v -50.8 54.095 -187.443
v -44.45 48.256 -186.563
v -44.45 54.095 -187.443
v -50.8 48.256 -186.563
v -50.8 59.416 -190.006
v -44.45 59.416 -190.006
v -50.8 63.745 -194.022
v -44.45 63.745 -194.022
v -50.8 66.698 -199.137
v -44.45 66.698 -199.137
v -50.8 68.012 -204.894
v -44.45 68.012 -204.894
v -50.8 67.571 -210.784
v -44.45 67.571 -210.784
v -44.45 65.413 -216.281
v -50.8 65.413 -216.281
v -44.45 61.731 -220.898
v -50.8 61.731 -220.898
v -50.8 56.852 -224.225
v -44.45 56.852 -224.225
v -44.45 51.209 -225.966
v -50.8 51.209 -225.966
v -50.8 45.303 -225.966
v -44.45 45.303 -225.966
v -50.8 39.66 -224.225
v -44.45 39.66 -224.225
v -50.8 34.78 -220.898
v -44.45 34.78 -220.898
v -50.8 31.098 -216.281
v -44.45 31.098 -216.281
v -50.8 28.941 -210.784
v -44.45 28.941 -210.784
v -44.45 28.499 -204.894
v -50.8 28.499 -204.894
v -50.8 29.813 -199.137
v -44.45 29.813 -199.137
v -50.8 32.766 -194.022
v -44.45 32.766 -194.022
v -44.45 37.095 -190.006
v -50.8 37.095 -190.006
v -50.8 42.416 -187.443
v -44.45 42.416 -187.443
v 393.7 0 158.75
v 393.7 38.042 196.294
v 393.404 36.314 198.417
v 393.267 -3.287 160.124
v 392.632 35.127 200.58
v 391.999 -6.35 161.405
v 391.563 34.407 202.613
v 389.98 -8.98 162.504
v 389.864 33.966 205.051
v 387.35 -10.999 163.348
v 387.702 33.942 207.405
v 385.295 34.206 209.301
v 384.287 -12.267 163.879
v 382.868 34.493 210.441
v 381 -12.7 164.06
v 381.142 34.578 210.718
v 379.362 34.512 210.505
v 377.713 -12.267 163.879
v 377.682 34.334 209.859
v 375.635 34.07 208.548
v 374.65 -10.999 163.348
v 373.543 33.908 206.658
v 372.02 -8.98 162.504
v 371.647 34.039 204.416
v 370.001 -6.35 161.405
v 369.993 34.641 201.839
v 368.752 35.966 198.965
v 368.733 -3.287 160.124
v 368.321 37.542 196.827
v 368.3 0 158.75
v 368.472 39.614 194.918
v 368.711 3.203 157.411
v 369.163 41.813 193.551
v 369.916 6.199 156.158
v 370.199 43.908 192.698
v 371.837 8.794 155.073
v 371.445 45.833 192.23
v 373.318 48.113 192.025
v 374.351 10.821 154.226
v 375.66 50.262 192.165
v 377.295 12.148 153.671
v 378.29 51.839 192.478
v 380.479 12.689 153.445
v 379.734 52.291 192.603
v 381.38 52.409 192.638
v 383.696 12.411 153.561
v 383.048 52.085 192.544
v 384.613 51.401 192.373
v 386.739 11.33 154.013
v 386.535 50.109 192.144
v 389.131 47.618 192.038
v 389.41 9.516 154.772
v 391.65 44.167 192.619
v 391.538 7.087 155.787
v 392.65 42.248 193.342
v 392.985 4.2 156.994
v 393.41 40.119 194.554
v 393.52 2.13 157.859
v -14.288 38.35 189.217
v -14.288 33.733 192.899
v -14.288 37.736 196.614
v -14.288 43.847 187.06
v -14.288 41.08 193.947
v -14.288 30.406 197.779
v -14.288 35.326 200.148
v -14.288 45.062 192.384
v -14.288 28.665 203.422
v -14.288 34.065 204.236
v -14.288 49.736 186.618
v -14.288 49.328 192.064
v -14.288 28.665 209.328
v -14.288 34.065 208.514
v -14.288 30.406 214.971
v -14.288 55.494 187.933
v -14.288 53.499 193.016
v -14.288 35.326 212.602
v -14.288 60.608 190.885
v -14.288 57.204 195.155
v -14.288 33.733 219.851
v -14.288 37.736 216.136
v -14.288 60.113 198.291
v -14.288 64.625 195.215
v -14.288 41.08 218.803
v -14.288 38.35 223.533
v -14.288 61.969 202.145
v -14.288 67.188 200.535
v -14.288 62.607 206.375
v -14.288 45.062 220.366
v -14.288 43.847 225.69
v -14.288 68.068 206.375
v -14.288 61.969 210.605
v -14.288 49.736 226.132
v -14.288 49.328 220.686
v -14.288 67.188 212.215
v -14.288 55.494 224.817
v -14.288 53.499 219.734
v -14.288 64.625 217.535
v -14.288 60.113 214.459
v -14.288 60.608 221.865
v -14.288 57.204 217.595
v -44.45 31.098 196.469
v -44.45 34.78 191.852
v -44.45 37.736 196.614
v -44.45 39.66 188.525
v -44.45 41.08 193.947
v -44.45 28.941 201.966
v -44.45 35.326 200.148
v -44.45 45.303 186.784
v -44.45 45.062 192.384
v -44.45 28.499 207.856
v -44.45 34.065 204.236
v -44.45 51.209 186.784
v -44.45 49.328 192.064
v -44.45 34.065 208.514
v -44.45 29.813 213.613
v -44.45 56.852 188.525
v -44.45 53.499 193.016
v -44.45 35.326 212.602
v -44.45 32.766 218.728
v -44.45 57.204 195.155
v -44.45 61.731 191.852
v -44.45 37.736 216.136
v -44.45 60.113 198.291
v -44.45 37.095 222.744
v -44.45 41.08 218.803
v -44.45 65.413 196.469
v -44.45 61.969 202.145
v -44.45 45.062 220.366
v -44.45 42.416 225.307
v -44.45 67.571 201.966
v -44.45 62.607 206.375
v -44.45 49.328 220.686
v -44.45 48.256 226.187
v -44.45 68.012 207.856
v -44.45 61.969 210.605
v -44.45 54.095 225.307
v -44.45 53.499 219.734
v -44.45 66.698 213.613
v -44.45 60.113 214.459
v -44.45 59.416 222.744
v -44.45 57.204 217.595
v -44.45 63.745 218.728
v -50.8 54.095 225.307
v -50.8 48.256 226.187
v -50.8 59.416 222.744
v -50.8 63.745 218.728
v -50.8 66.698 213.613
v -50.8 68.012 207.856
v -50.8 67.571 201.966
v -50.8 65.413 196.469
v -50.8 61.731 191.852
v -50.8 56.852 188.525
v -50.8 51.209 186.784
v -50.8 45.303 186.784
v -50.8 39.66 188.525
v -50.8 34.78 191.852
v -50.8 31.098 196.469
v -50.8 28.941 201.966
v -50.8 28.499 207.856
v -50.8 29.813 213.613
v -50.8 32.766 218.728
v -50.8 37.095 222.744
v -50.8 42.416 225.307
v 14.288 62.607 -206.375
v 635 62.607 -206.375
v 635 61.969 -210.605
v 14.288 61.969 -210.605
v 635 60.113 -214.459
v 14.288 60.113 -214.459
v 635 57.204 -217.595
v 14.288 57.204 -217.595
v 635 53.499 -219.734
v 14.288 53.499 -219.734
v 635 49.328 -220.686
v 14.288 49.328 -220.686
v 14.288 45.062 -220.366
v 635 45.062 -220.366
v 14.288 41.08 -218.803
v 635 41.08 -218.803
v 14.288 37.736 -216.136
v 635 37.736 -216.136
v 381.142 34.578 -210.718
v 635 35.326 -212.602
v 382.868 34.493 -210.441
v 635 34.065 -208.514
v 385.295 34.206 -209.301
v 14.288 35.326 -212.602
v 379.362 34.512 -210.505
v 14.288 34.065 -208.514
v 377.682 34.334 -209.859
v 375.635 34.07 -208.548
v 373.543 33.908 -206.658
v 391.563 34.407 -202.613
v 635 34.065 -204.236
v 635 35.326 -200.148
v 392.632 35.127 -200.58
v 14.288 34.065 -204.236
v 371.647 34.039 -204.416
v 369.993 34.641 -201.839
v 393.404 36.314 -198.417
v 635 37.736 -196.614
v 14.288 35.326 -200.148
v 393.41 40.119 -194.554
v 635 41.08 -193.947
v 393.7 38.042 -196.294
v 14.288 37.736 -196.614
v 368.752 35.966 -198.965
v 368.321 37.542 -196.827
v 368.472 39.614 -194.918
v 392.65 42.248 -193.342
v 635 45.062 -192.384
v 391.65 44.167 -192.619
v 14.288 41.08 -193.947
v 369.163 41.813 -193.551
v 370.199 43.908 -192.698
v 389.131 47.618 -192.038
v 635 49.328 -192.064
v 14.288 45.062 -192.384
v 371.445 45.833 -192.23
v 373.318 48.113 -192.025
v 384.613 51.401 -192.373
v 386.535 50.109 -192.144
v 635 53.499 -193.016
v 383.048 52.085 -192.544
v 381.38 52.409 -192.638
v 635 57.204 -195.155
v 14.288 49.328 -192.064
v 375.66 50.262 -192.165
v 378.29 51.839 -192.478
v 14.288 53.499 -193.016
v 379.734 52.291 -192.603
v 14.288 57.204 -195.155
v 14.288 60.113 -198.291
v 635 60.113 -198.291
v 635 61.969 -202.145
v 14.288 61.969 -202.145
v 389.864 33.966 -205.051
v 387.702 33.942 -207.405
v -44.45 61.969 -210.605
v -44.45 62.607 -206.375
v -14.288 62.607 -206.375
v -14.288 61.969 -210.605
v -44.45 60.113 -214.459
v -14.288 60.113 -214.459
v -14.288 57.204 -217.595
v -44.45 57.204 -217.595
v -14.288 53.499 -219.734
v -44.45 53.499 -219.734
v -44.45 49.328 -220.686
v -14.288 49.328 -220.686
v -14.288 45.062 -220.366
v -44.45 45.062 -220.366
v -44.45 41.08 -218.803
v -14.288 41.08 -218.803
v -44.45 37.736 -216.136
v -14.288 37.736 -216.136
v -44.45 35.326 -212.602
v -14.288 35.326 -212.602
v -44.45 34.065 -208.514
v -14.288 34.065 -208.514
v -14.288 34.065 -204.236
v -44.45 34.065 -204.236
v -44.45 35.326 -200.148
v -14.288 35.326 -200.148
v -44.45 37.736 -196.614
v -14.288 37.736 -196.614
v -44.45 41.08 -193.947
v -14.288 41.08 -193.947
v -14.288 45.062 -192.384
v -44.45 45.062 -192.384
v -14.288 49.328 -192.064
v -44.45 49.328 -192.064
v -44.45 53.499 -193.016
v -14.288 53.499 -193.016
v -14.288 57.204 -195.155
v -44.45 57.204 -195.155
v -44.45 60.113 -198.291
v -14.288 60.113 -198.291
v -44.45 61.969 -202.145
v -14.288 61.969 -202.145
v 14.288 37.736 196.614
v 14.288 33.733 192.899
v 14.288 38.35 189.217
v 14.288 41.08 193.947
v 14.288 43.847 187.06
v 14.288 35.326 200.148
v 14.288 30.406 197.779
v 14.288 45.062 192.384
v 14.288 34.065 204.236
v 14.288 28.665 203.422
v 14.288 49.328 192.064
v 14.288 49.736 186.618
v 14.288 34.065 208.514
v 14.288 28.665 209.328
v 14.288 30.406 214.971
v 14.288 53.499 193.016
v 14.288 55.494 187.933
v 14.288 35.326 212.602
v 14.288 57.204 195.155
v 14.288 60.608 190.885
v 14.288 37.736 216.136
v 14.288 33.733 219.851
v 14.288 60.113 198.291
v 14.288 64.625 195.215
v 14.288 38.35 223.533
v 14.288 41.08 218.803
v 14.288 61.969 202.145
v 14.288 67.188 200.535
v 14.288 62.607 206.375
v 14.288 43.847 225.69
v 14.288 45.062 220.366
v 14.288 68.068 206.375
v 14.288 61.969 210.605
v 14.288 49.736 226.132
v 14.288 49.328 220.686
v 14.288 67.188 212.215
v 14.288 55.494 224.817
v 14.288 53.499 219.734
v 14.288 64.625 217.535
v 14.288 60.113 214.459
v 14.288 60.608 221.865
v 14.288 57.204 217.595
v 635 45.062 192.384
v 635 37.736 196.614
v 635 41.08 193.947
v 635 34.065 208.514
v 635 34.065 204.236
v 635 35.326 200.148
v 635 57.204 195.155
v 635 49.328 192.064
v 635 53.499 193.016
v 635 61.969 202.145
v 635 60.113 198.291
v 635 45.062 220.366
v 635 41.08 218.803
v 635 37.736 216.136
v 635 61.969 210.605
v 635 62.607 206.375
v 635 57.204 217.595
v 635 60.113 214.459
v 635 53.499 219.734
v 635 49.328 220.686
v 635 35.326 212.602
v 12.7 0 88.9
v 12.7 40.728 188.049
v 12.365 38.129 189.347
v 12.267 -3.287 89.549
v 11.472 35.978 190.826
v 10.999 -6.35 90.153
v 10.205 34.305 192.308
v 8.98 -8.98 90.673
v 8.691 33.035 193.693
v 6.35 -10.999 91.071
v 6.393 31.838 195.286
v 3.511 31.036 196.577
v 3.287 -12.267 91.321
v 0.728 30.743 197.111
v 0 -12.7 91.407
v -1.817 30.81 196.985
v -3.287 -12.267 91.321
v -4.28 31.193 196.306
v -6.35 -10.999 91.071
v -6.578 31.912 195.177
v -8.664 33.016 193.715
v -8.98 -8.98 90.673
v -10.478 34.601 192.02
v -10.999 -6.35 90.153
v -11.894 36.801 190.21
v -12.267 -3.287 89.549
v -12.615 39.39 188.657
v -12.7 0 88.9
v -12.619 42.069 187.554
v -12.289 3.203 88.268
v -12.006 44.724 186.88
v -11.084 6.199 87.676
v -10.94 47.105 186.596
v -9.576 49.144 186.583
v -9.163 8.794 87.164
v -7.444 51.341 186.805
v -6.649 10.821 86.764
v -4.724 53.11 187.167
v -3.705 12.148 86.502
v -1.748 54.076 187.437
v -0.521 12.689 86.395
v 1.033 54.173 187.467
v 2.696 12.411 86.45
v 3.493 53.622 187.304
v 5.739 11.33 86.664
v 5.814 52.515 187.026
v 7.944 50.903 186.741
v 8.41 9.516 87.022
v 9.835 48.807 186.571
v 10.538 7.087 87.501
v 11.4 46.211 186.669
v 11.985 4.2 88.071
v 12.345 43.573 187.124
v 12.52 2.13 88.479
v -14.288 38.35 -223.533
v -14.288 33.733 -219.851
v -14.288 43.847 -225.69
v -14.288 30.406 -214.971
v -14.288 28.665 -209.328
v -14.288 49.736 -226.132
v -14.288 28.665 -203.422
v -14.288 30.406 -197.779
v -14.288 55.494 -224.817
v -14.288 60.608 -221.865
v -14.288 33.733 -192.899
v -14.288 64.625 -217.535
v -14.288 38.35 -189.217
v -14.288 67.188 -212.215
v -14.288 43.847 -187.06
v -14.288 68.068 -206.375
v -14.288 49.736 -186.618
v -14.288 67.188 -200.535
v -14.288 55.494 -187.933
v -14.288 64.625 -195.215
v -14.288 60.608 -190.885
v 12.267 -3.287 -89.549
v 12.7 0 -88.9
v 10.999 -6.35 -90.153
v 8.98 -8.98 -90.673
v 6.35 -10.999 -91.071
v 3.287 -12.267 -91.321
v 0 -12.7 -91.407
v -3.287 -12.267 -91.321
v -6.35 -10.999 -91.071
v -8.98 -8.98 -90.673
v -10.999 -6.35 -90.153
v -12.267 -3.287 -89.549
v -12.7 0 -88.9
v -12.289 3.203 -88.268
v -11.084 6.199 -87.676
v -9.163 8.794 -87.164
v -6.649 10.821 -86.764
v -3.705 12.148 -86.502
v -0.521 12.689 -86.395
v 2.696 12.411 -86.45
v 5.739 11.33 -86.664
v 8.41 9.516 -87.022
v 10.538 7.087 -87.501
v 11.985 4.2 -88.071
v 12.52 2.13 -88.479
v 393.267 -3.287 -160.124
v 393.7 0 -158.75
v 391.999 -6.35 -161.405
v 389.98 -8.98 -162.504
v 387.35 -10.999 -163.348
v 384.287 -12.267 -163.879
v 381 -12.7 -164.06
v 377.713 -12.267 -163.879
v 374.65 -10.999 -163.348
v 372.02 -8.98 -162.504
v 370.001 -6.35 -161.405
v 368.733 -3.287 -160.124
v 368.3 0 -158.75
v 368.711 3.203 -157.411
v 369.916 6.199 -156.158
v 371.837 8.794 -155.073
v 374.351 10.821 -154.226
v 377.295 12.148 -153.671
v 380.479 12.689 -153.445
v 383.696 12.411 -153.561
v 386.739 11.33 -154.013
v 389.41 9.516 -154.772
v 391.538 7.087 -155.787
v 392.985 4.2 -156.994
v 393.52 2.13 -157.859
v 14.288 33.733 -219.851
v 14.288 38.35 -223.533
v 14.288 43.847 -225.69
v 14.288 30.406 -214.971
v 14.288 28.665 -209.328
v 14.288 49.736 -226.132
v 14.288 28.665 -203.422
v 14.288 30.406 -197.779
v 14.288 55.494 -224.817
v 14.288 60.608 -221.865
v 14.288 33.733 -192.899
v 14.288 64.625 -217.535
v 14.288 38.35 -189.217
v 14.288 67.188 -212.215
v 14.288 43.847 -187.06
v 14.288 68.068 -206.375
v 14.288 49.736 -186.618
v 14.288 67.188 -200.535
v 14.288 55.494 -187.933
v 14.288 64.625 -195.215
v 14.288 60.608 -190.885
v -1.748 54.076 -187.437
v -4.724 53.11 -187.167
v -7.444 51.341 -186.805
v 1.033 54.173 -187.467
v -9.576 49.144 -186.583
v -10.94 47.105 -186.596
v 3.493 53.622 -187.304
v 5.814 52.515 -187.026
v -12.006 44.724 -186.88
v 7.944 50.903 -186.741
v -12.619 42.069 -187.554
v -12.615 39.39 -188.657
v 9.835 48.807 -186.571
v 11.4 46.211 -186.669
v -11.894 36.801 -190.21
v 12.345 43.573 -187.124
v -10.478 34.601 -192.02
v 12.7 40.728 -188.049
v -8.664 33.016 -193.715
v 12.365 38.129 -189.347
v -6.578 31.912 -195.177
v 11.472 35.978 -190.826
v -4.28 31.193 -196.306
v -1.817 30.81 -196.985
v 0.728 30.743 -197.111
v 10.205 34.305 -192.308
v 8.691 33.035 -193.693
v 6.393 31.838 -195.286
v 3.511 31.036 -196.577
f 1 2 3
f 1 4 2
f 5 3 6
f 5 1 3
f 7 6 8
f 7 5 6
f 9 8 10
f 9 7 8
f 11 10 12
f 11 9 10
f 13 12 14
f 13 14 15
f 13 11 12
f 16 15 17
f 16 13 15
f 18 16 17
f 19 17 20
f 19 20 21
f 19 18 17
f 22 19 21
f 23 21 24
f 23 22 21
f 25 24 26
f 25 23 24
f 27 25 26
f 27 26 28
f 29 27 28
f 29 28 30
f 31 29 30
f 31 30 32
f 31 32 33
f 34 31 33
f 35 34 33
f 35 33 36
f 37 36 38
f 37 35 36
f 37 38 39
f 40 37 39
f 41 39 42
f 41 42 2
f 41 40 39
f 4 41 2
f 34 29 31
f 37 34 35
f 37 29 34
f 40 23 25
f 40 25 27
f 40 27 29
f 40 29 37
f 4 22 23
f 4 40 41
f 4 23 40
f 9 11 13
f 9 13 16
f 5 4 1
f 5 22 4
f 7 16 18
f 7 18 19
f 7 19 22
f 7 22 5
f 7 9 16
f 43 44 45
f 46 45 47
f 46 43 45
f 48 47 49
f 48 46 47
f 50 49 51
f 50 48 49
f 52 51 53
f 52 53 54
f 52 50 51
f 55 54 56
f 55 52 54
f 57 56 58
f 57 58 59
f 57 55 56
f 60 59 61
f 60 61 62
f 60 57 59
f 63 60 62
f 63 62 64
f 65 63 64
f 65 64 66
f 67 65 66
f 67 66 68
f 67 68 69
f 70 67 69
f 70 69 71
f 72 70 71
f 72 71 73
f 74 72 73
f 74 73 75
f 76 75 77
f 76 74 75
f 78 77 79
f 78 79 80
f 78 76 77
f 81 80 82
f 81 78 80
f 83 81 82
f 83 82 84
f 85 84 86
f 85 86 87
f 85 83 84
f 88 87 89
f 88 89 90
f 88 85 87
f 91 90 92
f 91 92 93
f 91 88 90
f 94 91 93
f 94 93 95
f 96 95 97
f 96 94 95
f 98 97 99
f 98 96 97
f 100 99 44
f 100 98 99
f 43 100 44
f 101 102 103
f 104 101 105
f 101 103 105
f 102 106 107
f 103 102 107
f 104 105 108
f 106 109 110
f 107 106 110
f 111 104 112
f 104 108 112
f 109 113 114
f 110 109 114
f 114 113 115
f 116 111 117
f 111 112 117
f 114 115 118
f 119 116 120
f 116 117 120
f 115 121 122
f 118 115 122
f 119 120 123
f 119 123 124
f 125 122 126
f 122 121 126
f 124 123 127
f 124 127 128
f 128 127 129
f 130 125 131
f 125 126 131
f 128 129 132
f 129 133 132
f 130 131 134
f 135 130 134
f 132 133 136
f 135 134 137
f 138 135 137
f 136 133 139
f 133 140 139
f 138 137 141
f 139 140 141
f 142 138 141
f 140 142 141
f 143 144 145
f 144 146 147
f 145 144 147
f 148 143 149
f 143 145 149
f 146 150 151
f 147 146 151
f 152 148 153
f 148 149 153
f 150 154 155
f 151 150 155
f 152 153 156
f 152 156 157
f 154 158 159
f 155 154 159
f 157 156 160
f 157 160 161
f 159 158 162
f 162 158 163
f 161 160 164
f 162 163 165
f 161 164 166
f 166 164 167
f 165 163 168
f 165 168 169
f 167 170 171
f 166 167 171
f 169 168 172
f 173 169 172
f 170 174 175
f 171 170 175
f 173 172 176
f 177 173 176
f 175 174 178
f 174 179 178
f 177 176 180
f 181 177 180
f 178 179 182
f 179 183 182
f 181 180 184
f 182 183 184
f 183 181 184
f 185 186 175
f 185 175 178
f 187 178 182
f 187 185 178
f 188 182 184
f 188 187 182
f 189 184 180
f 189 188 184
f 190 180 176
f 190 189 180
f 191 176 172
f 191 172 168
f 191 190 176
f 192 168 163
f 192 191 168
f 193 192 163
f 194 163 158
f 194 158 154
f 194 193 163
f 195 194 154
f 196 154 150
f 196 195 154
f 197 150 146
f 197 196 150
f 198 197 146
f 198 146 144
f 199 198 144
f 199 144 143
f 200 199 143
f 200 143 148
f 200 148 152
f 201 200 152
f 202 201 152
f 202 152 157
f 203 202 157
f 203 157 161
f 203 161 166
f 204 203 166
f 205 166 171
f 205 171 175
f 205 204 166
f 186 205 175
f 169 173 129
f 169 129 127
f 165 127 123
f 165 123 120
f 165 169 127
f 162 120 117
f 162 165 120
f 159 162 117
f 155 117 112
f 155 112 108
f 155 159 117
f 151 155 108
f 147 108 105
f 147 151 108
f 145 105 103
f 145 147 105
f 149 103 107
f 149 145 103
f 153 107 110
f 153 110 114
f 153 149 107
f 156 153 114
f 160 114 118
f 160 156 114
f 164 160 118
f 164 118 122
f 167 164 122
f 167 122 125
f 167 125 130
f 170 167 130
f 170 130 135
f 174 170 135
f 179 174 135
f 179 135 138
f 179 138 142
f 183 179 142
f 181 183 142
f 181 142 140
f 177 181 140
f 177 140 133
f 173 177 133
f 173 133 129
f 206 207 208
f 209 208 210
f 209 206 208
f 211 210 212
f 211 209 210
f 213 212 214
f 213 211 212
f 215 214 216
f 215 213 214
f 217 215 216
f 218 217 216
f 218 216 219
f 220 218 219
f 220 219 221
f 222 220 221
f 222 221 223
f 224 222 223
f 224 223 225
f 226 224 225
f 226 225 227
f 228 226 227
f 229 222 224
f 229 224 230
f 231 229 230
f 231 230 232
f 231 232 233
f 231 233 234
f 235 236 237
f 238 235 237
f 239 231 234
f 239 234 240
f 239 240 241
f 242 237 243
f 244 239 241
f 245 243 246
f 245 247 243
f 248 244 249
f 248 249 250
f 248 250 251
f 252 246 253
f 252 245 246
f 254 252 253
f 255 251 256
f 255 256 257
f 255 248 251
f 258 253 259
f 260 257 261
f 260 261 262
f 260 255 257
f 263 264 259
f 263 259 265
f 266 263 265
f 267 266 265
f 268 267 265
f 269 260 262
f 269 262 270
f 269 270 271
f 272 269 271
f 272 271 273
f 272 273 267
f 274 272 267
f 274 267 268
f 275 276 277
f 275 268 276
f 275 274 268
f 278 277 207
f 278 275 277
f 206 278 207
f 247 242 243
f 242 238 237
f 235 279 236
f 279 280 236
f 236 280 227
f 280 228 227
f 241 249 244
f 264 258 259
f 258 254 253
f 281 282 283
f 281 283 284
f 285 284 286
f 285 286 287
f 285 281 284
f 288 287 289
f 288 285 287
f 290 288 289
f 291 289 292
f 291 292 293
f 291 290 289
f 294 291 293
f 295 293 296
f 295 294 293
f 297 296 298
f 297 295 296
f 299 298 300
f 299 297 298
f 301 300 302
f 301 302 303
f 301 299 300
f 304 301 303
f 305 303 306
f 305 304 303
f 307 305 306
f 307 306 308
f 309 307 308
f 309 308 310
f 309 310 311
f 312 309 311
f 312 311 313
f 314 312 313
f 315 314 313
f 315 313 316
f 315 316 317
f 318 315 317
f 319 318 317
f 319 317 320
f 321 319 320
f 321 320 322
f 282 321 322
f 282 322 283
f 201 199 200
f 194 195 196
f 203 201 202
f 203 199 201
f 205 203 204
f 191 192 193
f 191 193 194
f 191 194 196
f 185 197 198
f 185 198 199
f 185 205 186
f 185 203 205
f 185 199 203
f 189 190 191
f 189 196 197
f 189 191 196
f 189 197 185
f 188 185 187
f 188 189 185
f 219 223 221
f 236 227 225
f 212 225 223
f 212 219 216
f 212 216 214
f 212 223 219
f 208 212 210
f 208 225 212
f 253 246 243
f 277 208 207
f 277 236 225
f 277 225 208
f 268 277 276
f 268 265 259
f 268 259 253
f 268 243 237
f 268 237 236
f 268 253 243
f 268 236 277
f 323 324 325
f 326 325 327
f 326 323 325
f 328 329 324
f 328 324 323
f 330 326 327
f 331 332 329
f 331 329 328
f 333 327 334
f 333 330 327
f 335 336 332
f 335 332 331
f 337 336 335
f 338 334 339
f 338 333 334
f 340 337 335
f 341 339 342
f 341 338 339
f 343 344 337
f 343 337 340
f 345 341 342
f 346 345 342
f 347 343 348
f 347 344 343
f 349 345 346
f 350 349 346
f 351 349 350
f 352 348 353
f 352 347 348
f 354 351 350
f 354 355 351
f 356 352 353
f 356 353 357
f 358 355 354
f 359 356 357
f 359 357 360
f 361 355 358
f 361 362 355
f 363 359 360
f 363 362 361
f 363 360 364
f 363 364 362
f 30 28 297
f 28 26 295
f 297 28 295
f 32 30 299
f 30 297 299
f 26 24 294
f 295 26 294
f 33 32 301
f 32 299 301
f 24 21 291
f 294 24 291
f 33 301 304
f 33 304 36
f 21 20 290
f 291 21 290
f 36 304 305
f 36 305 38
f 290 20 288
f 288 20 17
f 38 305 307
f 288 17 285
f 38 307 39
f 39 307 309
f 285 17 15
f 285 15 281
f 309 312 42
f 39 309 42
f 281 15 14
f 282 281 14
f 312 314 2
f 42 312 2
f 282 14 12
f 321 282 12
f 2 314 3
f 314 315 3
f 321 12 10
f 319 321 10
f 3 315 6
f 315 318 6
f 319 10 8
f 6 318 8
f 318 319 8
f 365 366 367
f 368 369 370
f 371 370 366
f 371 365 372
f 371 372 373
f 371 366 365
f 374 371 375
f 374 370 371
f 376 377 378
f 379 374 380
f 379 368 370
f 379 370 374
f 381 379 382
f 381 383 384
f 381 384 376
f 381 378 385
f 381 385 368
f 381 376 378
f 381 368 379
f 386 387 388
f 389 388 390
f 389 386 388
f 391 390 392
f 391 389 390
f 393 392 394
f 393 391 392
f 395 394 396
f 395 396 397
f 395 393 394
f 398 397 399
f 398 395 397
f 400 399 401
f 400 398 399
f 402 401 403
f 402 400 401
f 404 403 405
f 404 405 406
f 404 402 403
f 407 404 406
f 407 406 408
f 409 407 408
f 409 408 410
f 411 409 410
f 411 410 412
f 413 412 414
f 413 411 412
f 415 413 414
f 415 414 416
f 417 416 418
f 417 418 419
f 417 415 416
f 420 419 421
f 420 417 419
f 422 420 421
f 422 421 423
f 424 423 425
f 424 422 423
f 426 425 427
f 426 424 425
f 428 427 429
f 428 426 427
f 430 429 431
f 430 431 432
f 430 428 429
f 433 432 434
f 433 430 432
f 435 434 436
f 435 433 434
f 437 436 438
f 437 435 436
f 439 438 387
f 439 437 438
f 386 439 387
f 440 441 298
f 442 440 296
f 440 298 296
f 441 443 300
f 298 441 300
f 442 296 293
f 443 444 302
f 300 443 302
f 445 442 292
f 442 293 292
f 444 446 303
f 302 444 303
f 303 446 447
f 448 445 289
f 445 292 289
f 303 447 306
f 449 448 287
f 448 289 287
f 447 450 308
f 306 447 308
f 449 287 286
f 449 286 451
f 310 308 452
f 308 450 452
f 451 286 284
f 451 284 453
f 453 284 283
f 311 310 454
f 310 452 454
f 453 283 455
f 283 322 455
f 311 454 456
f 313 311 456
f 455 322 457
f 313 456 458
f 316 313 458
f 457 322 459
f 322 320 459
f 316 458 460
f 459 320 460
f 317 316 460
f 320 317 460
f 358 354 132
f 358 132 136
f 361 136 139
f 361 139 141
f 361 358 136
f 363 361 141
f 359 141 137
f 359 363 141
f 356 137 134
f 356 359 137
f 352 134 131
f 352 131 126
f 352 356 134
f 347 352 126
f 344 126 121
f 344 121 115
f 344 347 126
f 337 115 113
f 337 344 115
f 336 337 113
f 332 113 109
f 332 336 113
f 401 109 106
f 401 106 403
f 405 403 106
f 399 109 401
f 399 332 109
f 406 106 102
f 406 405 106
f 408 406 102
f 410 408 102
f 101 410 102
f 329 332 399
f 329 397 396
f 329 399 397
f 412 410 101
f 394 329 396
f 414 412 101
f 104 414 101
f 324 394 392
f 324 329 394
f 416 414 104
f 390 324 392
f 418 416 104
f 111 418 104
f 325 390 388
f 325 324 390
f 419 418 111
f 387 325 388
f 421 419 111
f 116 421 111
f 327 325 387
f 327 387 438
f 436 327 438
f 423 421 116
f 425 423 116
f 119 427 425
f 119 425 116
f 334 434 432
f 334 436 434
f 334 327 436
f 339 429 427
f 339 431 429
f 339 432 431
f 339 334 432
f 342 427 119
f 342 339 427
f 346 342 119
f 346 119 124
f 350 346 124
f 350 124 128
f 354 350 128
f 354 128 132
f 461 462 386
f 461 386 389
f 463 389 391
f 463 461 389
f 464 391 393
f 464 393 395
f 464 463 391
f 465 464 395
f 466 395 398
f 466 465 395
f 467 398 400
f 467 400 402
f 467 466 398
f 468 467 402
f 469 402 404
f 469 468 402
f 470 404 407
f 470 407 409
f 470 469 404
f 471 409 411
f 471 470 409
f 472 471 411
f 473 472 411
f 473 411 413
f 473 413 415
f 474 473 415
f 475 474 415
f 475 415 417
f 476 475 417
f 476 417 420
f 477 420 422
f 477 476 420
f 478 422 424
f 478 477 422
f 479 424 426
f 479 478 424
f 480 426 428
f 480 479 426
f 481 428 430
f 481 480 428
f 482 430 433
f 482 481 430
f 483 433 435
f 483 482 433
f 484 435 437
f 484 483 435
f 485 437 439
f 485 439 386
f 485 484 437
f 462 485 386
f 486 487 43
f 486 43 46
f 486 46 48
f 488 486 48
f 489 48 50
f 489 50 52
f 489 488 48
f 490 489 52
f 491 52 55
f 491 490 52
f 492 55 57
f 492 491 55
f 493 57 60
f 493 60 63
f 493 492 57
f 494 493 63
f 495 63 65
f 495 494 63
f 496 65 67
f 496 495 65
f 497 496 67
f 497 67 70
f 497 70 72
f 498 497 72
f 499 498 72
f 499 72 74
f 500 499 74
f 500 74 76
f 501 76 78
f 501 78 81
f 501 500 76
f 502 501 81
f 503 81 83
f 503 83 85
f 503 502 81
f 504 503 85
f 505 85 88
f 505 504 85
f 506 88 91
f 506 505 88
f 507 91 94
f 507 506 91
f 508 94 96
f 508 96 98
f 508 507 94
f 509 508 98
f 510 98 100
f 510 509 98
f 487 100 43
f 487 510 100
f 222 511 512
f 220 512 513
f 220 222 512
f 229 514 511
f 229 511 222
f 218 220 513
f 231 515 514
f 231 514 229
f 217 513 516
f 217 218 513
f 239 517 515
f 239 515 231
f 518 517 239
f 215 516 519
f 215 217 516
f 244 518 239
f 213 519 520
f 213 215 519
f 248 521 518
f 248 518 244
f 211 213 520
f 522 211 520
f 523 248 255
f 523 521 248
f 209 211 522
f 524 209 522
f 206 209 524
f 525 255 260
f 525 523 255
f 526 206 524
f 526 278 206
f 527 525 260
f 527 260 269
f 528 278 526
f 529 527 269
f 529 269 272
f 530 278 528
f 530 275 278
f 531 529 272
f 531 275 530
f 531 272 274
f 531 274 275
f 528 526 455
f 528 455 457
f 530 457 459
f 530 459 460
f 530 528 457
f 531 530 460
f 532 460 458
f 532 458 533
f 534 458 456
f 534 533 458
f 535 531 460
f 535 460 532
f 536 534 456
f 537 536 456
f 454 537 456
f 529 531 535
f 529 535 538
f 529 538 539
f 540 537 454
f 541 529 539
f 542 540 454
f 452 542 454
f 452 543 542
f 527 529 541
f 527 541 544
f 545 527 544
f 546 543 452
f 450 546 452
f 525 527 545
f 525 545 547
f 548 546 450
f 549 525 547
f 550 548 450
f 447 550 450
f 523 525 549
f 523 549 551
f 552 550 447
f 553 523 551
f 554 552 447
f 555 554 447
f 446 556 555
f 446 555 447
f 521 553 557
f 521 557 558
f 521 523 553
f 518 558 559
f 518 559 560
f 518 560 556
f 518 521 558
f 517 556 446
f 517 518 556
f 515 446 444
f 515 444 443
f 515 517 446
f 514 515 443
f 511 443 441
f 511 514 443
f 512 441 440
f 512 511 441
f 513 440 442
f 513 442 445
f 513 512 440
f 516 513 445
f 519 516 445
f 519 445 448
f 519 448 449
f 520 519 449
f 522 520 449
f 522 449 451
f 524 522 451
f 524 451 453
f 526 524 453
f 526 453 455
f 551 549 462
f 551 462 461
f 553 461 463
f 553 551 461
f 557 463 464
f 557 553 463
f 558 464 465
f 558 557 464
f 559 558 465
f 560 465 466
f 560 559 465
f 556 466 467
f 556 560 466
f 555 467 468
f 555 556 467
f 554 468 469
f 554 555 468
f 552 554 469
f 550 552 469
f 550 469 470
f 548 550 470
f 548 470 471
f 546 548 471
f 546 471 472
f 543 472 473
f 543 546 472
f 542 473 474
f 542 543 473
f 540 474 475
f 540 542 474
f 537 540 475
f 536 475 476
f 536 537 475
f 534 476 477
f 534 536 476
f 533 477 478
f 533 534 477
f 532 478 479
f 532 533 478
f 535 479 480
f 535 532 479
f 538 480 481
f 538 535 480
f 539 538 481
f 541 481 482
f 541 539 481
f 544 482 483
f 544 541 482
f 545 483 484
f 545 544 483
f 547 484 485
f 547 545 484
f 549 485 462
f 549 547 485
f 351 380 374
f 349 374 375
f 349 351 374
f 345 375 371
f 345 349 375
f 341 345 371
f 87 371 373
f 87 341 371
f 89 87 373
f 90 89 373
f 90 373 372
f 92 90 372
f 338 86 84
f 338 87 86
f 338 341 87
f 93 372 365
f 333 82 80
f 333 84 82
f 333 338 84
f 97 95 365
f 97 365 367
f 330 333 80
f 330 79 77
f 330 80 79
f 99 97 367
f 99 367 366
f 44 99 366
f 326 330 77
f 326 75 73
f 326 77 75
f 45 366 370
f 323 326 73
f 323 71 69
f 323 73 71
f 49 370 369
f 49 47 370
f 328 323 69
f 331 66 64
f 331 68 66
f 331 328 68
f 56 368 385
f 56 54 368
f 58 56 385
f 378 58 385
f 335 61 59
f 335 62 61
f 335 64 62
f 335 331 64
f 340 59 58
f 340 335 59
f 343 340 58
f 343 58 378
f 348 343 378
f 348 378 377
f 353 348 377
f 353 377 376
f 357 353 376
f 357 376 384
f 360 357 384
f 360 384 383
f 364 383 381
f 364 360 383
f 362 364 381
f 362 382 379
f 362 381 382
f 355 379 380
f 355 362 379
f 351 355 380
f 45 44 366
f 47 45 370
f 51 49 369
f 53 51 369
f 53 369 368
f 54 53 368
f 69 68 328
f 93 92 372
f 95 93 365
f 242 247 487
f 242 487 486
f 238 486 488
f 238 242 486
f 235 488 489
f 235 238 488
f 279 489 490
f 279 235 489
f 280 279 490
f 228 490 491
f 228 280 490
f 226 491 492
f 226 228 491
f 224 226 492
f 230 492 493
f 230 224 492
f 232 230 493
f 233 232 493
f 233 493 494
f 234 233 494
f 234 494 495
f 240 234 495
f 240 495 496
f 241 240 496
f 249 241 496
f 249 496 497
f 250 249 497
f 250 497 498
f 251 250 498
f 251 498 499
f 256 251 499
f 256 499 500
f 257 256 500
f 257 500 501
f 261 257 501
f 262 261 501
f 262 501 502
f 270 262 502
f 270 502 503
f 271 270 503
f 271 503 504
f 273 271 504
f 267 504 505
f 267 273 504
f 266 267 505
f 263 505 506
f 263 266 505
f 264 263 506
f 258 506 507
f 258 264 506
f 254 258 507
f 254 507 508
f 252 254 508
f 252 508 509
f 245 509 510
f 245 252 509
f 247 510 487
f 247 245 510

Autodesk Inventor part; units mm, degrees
ref_plane "XZ Plane" through (0, 0, 0) normal (0, 1, 0) x (-1, 0, 0)
ref_plane "XY Plane" through (0, 0, 0) normal (0, 0, 1) x (1, 0, 0)
sketch "Sketch1" plane through (0, 0, 0) normal (0, 0, 1) x (1, 0, 0)
  circle A0 centre (0, 0) radius 12.7
  dimension "d0" = 25.4
sketch "Sketch2" plane through (0, 0, 0) normal (1, 0, 0) x (0, 1, 0)
  line L0 (0, 88.9) -> (0, -88.9)
  line L1 (0, -88.9) -> (48.2558, -206.375)
  line L2 (0, 88.9) -> (48.2558, 206.375)
  line L3 (48.2558, -206.375) -> (232.1871, -206.375) construction
  point P0 (0, 0)
  dimension "d1" = 88.9
  dimension "d2" = 177.8
  dimension "d3" = 412.75
  dimension "d5" = 127
  dimension "d26" = 112.332
sweep "Sweep1" add profiles "Sketch1" path "Sketch2"
ref_plane "Work Plane1" through (381, 0, 0) normal (1, 0, 0) x (0, 1, 0)
sketch "Sketch3" plane through (0, 0, 0) normal (0, 0, 1) x (1, 0, 0)
  circle A0 centre (381, 0) radius 12.7
  point P0 (0, 0)
  dimension "d9" = 381
  dimension "d10" = 25.4
sketch "Sketch4" plane through (381, 0, 0) normal (1, 0, 0) x (0, 1, 0)
  line L0 (60.0033, 201.5494) -> (36.5083, 211.2006) projected
  line L1 (48.2558, 206.375) -> (0, 158.75)
  line L2 (0, 158.75) -> (0, -158.75)
  line L3 (0, -158.75) -> (48.2558, -206.375)
  line L4 (36.5083, -211.2006) -> (60.0033, -201.5494) projected
  point P0 (0, 0)
  point P1 (0, 0)
  dimension "d11" = 317.5
  dimension "d13" = 0
sweep "Sweep2" add profiles "Sketch3" path "Sketch4" path curves L3 L2 L1
sketch "Sketch5" plane through (0, 0, 0) normal (1, 0, 0) x (0, 1, 0)
  line L0 (39.3348, -215.4141) -> (57.1768, -197.3359) projected
  line L1 (36.5083, -211.2006) -> (60.0033, -201.5494) projected
  line L2 (57.1768, 197.3359) -> (39.3348, 215.4141) projected
  line L3 (60.0033, 201.5494) -> (36.5083, 211.2006) projected
  circle A0 centre (48.2558, 206.375) radius 14.351
  circle A1 centre (48.2558, -206.375) radius 14.351
  point P0 (0, 0)
  dimension "d16" = 28.702
extrude "Extrusion1" add sketch "Sketch5" along normal blind 635 and the other way blind 50.8
sketch "Sketch6" plane through (0, 0, 0) normal (1, 0, 0) x (0, 1, 0)
  circle A0 centre (48.2558, 206.375) radius 14.351 projected
  circle A1 centre (48.2558, -206.375) radius 14.351 projected
  circle A2 centre (48.2558, -206.375) radius 19.812
  circle A3 centre (48.2558, 206.375) radius 19.812
  point P0 (0, 0)
  dimension "d21" = 39.624
extrude "Extrusion2" add sketch "Sketch6" along normal mid plane 28.575 contours A0 | A1 | A2 | A3
sketch "Sketch7" plane through (-50.8, 48.2558, 206.375) normal (-1, 0, 0) x (0, 0, 1)
  circle A0 centre (-412.75, 0) radius 14.351 projected
  circle A1 centre (0, 0) radius 14.351 projected
  circle A2 centre (-412.75, 0) radius 19.812 projected
  circle A3 centre (0, 0) radius 19.812 projected
  point P0 (-206.375, -48.2558)
extrude "Extrusion3" add sketch "Sketch7" against normal blind 6.35 contours A0 | A1 | A2 | A3
equation "\"d1\" = 0.5 * d2"
properties part number "front bar" material "Aluminum 6061"
